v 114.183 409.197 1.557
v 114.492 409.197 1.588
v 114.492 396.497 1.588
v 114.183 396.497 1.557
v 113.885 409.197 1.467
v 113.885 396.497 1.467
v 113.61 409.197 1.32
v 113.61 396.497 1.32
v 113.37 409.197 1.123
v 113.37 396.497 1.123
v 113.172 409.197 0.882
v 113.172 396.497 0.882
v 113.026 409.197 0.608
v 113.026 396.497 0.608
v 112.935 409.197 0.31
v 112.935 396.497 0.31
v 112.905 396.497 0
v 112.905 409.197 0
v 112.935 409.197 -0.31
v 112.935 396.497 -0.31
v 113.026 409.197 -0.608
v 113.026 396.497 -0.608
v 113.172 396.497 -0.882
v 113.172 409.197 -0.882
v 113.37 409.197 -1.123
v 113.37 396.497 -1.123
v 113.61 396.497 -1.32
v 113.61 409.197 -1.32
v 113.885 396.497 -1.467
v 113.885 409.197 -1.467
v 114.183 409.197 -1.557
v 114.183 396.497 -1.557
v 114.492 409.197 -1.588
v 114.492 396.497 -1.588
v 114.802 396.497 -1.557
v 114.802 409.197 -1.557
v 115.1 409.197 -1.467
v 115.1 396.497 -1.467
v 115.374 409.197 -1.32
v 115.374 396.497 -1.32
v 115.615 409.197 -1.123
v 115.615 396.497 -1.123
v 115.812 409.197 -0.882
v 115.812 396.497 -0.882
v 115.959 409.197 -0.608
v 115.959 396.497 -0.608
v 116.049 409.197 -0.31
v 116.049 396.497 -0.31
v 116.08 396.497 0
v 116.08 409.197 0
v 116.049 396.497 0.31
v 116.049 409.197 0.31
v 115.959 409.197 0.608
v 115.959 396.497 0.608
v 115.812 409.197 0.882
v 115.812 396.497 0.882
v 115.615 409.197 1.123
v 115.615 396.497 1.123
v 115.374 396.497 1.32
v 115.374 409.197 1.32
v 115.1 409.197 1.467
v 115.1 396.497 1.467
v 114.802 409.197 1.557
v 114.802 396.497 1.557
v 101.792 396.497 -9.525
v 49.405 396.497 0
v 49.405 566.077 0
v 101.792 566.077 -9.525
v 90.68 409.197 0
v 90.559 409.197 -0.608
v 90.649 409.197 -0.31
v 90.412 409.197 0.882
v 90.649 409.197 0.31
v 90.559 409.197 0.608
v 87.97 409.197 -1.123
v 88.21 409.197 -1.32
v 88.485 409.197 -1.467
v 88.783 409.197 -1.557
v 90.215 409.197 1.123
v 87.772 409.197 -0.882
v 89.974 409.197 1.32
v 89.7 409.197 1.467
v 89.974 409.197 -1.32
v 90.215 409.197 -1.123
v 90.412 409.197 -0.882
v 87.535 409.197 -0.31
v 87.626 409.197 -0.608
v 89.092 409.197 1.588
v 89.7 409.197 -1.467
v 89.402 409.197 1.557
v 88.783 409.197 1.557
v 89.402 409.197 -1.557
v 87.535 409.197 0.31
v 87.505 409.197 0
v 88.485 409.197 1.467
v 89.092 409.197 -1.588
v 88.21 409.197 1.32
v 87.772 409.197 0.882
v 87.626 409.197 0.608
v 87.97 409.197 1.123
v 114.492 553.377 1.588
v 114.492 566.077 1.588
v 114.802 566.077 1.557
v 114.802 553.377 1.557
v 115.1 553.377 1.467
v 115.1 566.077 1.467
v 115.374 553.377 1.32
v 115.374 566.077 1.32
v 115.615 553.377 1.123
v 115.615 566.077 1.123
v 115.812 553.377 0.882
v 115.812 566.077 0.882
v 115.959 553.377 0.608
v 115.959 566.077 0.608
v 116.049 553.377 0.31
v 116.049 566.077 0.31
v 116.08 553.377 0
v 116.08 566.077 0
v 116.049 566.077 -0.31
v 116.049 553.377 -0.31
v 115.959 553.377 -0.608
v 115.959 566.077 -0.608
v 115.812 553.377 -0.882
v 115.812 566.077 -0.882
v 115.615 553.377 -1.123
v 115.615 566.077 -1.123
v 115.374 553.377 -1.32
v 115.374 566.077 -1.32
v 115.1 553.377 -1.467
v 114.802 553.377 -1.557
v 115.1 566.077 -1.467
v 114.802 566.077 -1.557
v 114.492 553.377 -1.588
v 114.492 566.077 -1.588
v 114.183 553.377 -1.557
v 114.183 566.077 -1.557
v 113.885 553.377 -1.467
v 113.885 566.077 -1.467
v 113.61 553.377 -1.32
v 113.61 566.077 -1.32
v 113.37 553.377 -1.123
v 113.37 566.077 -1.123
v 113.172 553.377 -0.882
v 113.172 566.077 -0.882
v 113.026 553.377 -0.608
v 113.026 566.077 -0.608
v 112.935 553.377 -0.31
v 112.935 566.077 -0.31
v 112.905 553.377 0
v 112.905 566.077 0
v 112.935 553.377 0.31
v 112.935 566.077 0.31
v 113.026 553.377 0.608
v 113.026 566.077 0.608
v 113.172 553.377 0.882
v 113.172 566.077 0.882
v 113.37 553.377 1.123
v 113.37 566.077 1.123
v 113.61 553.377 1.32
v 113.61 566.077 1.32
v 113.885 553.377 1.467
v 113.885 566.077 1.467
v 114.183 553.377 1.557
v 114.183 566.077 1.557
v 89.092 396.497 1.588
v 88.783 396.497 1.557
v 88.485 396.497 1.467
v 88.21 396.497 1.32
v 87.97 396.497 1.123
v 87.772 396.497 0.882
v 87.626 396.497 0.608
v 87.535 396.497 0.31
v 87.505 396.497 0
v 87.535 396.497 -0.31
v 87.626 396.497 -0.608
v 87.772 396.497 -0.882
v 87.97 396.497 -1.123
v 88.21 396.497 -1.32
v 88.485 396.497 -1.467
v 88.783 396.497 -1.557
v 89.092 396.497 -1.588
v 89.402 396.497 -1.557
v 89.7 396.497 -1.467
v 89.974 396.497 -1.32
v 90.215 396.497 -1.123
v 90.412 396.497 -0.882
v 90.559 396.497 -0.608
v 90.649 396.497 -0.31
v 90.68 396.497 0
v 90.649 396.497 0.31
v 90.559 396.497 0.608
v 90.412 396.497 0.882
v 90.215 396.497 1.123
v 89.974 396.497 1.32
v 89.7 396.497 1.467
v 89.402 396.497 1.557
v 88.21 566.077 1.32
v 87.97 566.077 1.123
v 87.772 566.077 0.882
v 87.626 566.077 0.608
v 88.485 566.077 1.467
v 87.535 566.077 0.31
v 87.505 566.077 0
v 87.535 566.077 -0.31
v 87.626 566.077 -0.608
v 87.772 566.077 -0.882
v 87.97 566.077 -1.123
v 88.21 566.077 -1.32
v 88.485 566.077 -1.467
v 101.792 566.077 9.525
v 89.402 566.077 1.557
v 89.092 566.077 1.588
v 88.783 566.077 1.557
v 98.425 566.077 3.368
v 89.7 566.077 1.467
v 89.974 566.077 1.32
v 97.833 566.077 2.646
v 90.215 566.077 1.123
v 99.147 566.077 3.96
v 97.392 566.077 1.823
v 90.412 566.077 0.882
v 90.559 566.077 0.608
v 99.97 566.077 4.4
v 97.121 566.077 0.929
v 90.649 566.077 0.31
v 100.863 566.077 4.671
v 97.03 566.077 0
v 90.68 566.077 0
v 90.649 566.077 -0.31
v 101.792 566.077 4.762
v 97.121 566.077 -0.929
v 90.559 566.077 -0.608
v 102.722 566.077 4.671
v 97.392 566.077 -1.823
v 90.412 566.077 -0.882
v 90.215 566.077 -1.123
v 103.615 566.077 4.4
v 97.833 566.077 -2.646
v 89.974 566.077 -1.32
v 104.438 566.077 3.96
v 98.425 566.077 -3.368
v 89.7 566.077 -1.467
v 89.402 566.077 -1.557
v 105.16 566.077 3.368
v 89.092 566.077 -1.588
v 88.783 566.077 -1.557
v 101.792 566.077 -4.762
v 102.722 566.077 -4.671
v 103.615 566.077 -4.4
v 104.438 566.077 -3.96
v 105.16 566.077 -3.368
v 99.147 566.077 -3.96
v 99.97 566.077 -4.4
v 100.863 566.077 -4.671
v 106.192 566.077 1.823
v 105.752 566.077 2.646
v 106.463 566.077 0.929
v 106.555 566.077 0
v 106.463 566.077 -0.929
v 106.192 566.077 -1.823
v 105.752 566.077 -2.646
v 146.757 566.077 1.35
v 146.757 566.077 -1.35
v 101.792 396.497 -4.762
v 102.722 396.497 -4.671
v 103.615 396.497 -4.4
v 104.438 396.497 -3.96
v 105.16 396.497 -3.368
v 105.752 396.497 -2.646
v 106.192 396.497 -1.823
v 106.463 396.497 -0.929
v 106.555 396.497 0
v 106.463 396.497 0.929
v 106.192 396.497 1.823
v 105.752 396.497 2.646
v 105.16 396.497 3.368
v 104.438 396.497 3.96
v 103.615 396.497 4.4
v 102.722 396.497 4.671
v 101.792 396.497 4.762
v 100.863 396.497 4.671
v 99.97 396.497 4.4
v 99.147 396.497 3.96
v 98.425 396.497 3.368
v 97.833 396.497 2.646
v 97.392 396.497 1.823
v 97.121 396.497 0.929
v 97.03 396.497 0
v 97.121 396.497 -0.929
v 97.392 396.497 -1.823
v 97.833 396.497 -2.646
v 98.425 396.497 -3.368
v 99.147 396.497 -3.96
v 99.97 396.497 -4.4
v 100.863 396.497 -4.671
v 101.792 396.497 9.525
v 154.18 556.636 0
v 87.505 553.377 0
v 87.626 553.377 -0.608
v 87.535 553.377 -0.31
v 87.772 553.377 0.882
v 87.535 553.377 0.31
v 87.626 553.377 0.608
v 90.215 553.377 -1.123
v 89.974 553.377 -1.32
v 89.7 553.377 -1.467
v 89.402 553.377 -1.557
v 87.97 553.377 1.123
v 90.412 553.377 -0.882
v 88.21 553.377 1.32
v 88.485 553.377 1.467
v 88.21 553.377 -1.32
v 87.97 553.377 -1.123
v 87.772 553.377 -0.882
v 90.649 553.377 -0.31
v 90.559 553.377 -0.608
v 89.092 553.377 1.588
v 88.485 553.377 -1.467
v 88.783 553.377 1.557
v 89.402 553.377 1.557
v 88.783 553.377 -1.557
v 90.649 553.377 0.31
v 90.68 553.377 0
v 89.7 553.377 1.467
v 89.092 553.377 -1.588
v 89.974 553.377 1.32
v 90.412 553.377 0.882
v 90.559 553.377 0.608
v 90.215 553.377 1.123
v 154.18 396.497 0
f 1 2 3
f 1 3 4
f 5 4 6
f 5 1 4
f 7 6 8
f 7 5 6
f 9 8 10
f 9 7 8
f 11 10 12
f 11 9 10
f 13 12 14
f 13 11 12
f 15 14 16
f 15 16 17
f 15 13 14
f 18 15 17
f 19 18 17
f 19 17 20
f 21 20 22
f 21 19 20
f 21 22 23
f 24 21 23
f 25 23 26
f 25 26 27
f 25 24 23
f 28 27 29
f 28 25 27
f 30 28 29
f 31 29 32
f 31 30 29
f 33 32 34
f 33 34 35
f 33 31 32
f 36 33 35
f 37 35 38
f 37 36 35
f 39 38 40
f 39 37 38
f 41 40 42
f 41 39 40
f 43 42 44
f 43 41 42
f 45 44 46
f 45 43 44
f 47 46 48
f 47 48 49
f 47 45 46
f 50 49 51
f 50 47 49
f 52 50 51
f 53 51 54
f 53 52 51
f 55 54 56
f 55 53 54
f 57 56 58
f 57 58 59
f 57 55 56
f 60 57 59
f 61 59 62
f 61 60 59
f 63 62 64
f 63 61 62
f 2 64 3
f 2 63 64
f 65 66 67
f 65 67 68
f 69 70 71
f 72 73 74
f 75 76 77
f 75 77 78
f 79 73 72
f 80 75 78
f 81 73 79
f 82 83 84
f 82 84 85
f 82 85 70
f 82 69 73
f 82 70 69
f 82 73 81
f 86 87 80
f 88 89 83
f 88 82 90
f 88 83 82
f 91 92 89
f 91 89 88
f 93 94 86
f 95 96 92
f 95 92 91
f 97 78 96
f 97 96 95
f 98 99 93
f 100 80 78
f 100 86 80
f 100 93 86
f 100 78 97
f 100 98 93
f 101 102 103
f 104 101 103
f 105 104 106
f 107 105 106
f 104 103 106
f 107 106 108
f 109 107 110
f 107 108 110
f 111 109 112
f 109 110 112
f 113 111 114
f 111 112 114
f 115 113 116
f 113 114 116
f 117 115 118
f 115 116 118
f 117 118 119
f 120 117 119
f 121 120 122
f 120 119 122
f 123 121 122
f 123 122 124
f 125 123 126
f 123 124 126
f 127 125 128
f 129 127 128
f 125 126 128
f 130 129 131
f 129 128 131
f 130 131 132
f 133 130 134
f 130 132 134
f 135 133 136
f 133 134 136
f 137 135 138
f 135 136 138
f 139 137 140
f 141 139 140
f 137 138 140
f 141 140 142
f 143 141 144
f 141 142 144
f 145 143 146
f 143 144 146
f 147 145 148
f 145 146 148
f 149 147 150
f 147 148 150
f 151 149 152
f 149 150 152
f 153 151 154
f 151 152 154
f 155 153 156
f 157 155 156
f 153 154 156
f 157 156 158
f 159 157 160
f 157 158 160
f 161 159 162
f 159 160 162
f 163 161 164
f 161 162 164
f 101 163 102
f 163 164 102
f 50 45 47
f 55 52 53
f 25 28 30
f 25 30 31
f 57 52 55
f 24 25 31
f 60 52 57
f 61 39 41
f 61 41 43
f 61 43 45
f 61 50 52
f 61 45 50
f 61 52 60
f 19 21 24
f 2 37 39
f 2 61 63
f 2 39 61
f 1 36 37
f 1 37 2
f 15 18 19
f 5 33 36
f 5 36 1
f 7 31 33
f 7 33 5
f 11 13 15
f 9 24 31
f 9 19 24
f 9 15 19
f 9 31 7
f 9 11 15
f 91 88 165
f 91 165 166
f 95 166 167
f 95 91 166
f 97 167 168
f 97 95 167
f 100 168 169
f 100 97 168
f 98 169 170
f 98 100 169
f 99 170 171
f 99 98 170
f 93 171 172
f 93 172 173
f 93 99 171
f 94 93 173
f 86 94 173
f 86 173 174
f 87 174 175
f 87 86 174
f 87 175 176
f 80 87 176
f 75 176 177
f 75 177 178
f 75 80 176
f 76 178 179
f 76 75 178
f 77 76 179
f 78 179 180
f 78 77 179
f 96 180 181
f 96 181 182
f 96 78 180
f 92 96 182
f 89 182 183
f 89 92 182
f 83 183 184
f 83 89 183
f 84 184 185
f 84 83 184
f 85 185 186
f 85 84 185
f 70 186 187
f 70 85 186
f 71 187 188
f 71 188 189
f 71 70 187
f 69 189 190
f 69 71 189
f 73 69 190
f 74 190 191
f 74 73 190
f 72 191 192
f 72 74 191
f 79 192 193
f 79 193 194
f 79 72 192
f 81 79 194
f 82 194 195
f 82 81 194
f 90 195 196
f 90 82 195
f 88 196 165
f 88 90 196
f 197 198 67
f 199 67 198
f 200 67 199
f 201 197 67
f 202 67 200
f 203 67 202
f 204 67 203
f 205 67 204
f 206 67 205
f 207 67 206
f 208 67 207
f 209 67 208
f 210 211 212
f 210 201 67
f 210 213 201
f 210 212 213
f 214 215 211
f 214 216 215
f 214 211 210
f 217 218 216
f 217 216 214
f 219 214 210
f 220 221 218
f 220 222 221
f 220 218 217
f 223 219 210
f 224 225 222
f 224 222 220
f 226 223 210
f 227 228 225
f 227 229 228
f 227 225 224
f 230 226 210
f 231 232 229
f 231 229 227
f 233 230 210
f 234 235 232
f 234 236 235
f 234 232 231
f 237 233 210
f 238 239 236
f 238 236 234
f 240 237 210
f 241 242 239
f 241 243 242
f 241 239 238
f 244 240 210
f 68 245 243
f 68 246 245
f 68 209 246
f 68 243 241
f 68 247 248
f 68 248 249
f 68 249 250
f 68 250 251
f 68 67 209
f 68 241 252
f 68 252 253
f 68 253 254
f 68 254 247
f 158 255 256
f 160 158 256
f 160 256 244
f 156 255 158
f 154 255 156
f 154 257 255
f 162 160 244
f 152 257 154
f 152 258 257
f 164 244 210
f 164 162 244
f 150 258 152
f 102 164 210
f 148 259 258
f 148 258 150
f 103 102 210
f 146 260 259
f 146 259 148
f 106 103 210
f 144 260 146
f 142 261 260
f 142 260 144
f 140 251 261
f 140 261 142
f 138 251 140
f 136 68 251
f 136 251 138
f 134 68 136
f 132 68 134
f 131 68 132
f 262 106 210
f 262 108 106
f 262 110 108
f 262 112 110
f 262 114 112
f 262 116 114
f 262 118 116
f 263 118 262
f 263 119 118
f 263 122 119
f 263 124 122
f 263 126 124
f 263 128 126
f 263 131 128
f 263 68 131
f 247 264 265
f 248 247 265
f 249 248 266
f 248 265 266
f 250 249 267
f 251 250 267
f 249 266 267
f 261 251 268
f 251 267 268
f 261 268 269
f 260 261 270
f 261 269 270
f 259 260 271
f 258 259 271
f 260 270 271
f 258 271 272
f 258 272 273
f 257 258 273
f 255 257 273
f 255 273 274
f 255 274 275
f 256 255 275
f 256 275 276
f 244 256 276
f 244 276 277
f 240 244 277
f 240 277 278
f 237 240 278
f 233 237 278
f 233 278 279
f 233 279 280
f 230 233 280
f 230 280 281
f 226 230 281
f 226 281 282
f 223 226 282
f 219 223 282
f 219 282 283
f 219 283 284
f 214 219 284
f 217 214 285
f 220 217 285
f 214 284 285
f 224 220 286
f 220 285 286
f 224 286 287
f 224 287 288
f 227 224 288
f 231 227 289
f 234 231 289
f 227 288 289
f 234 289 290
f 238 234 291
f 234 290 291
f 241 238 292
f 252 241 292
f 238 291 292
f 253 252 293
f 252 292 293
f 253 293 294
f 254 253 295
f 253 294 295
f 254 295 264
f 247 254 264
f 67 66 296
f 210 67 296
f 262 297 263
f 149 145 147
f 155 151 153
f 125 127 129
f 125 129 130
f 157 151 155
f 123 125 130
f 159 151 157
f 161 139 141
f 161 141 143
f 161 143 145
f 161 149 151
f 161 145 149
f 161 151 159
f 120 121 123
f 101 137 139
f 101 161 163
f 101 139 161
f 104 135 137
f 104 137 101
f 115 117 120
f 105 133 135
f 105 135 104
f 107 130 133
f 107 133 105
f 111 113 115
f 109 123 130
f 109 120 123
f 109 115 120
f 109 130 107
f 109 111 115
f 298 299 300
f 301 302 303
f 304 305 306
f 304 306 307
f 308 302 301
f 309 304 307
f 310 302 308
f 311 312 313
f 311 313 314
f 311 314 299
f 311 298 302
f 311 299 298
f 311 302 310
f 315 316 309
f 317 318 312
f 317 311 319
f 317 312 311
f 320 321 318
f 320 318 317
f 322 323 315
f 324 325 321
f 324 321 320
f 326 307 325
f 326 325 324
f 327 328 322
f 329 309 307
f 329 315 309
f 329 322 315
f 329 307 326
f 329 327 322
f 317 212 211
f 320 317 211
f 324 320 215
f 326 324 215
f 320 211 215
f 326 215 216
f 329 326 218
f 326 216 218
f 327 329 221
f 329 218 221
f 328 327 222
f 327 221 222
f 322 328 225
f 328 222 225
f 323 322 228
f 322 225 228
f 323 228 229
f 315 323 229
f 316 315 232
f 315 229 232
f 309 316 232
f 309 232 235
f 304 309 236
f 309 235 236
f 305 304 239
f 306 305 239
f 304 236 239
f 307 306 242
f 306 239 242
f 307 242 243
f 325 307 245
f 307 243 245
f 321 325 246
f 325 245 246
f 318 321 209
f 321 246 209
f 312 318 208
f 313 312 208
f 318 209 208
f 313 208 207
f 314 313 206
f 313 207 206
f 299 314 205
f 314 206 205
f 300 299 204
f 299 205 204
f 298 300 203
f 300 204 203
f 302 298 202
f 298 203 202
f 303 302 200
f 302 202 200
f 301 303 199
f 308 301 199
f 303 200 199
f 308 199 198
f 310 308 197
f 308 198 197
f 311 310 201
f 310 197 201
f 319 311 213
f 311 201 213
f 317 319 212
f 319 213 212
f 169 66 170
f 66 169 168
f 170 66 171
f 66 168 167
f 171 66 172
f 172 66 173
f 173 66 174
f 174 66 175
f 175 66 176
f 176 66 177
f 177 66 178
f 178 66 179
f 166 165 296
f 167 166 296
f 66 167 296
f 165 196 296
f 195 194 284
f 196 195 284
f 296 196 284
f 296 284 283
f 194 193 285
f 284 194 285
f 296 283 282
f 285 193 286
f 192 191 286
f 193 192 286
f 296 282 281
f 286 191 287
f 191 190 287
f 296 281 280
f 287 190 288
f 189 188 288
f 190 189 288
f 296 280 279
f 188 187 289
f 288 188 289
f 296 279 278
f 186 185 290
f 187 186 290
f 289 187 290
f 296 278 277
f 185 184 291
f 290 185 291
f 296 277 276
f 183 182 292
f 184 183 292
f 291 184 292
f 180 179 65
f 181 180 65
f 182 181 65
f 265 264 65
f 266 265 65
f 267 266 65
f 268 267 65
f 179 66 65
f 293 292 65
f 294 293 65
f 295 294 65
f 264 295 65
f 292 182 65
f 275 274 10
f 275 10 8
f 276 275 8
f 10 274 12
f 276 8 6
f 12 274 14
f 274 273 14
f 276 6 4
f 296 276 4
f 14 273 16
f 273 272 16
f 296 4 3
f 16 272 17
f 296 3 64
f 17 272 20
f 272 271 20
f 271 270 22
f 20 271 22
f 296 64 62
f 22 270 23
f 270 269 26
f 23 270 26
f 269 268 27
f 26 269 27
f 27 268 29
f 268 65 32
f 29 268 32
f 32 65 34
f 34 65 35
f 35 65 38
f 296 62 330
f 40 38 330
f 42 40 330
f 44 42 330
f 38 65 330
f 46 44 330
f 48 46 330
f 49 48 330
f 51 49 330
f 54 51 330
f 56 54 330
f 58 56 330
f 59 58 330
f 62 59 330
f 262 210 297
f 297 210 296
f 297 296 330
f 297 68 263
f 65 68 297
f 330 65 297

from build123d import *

# Parameters (mm, degrees)
BOSS_EXTRUDE1_DEPTH      = 9.525
BOSS_EXTRUDE1_DEPTH_BACK = 9.525
CUT_EXTRUDE1_DEPTH       = 373.680910299
CUT_EXTRUDE2_DEPTH       = 373.680910299
SKETCH5_W                = 97.518379051
SKETCH5_H                = 136.419580789
CUT_EXTRUDE3_DEPTH       = 739.741184154
SKETCH6_W                = 75.100700845
SKETCH6_H                = 154.277977479
CUT_EXTRUDE4_DEPTH       = 748.678846608
SKETCH7_R                = 4.7625
CUT_EXTRUDE5_DEPTH       = 254
CUT_EXTRUDE6_DEPTH       = 752.699804454
CUT_EXTRUDE6_DEPTH_BACK  = 752.699804454
SKETCH9_R                = 1.5875
CUT_EXTRUDE7_DEPTH       = 12.7
CUT_EXTRUDE8_START       = -12.7
SKETCH10_R               = 1.5875
CUT_EXTRUDE8_DEPTH       = 12.7


with BuildPart() as part:
    # Sketch1 → Boss-Extrude1 (new, two sides: drawn at the far end of the back side and taken through both)
    with BuildSketch(Plane.XY.offset(-BOSS_EXTRUDE1_DEPTH_BACK)):
        Polygon((101.792411443, 735.656458749), (49.404911443, 673.557276224), (49.404911443, 396.497366015), (154.179911443, 396.497366015), (154.179911443, 556.636391043), (128.683999881, 589.063224066), (151.148766449, 589.063224066), (128.683999881, 617.634912224), (151.148766449, 617.634912224), (129.452026088, 645.229790529), (151.148766449, 645.229790529), (128.876006433, 673.557276224), (154.179911443, 673.557276224), align=None)
    extrude(amount=BOSS_EXTRUDE1_DEPTH + BOSS_EXTRUDE1_DEPTH_BACK)

    # Sketch2 → Cut-Extrude1 (cut, through all)
    with BuildSketch(Plane(origin=(0, 396.497366015, 0), x_dir=(-1, 0, 0), z_dir=(0, -1, 0))):
        Polygon((-49.404911443, 0), (-101.792411443, -9.525), (-154.179911443, 0), (-159.65732669, 0), (-159.65732669, -13.649148588), (-44.158493861, -13.649148588), (-44.158493861, 0), align=None)
    extrude(amount=-CUT_EXTRUDE1_DEPTH, mode=Mode.SUBTRACT)

    # Sketch3 → Cut-Extrude2 (cut, through all)
    with BuildSketch(Plane.XZ.offset(-396.497366015)):
        Polygon((49.404911443, 0), (101.792411443, -9.525), (154.179911443, 0), (159.580570647, 0), (159.580570647, -14.500746269), (43.682013433, -14.500746269), (43.682013433, 0), align=None)
    extrude(amount=-CUT_EXTRUDE2_DEPTH, mode=Mode.SUBTRACT)

    # Sketch5 → Cut-Extrude3 (cut, through all)
    with BuildSketch(Plane(origin=(26.430459561, 22.297003663, 133.782021979), x_dir=(0.9815360247212257, -0.031445805879602766, -0.1886748352776165), z_dir=(0.1912773697394791, 0.16136352846789567, 0.9681811708073739))):
        with Locations((89.248369642, 700.742830845)):
            Rectangle(SKETCH5_W, SKETCH5_H)
    cut_extrude3 = extrude(amount=CUT_EXTRUDE3_DEPTH, mode=Mode.SUBTRACT)

    # Sketch6 → Cut-Extrude4 (cut, through all)
    with BuildSketch(Plane(origin=(-18.981895096, 16.01331916, 96.079914958), x_dir=(0.9815360247212258, 0.03144580587960229, 0.18867483527761636), z_dir=(-0.19127736973947887, 0.1613635284678934, 0.9681811708073744))):
        with Locations((98.873573013, 697.792784398)):
            Rectangle(SKETCH6_W, SKETCH6_H)
    cut_extrude4 = extrude(amount=CUT_EXTRUDE4_DEPTH, mode=Mode.SUBTRACT)

    # Mirror1: Cut-Extrude3, Cut-Extrude4 across plane
    add(cut_extrude3.mirror(Plane.XY), mode=Mode.SUBTRACT)
    add(cut_extrude4.mirror(Plane.XY), mode=Mode.SUBTRACT)

    # Sketch7 → Cut-Extrude5 (cut)
    with BuildSketch(Plane.XZ.offset(-396.497366015)):
        with Locations((101.792411443, 0)):
            Circle(SKETCH7_R)
    extrude(amount=-CUT_EXTRUDE5_DEPTH, mode=Mode.SUBTRACT)

    # Sketch8 → Cut-Extrude6 (cut, two sides: drawn at the far end of the back side and taken through both)
    with BuildSketch(Plane.XY.offset(-CUT_EXTRUDE6_DEPTH_BACK)):
        Polygon((-21.644649604, 762.380461852), (-21.644649604, 566.076912382), (101.792411443, 566.076912382), (201.352960681, 566.076912382), (201.352960681, 762.380461852), align=None)
    extrude(amount=CUT_EXTRUDE6_DEPTH + CUT_EXTRUDE6_DEPTH_BACK, mode=Mode.SUBTRACT)

    # Sketch9 → Cut-Extrude7 (cut)
    with BuildSketch(Plane(origin=(0, 566.076912382, 0), x_dir=(1, 0, 0), z_dir=(0, 1, 0))):
        with Locations((89.092411443, 0)):
            Circle(SKETCH9_R)
        with Locations((114.492411443, 0)):
            Circle(SKETCH9_R)
    extrude(amount=-CUT_EXTRUDE7_DEPTH, mode=Mode.SUBTRACT)

    # Sketch10 → Cut-Extrude8 (cut)
    with BuildSketch(Plane.XZ.offset(-396.497366015).offset(CUT_EXTRUDE8_START)):
        with Locations((89.092411443, 0)):
            Circle(SKETCH10_R)
        with Locations((114.492411443, 0)):
            Circle(SKETCH10_R)
    extrude(amount=CUT_EXTRUDE8_DEPTH, mode=Mode.SUBTRACT)


solid = part.part
